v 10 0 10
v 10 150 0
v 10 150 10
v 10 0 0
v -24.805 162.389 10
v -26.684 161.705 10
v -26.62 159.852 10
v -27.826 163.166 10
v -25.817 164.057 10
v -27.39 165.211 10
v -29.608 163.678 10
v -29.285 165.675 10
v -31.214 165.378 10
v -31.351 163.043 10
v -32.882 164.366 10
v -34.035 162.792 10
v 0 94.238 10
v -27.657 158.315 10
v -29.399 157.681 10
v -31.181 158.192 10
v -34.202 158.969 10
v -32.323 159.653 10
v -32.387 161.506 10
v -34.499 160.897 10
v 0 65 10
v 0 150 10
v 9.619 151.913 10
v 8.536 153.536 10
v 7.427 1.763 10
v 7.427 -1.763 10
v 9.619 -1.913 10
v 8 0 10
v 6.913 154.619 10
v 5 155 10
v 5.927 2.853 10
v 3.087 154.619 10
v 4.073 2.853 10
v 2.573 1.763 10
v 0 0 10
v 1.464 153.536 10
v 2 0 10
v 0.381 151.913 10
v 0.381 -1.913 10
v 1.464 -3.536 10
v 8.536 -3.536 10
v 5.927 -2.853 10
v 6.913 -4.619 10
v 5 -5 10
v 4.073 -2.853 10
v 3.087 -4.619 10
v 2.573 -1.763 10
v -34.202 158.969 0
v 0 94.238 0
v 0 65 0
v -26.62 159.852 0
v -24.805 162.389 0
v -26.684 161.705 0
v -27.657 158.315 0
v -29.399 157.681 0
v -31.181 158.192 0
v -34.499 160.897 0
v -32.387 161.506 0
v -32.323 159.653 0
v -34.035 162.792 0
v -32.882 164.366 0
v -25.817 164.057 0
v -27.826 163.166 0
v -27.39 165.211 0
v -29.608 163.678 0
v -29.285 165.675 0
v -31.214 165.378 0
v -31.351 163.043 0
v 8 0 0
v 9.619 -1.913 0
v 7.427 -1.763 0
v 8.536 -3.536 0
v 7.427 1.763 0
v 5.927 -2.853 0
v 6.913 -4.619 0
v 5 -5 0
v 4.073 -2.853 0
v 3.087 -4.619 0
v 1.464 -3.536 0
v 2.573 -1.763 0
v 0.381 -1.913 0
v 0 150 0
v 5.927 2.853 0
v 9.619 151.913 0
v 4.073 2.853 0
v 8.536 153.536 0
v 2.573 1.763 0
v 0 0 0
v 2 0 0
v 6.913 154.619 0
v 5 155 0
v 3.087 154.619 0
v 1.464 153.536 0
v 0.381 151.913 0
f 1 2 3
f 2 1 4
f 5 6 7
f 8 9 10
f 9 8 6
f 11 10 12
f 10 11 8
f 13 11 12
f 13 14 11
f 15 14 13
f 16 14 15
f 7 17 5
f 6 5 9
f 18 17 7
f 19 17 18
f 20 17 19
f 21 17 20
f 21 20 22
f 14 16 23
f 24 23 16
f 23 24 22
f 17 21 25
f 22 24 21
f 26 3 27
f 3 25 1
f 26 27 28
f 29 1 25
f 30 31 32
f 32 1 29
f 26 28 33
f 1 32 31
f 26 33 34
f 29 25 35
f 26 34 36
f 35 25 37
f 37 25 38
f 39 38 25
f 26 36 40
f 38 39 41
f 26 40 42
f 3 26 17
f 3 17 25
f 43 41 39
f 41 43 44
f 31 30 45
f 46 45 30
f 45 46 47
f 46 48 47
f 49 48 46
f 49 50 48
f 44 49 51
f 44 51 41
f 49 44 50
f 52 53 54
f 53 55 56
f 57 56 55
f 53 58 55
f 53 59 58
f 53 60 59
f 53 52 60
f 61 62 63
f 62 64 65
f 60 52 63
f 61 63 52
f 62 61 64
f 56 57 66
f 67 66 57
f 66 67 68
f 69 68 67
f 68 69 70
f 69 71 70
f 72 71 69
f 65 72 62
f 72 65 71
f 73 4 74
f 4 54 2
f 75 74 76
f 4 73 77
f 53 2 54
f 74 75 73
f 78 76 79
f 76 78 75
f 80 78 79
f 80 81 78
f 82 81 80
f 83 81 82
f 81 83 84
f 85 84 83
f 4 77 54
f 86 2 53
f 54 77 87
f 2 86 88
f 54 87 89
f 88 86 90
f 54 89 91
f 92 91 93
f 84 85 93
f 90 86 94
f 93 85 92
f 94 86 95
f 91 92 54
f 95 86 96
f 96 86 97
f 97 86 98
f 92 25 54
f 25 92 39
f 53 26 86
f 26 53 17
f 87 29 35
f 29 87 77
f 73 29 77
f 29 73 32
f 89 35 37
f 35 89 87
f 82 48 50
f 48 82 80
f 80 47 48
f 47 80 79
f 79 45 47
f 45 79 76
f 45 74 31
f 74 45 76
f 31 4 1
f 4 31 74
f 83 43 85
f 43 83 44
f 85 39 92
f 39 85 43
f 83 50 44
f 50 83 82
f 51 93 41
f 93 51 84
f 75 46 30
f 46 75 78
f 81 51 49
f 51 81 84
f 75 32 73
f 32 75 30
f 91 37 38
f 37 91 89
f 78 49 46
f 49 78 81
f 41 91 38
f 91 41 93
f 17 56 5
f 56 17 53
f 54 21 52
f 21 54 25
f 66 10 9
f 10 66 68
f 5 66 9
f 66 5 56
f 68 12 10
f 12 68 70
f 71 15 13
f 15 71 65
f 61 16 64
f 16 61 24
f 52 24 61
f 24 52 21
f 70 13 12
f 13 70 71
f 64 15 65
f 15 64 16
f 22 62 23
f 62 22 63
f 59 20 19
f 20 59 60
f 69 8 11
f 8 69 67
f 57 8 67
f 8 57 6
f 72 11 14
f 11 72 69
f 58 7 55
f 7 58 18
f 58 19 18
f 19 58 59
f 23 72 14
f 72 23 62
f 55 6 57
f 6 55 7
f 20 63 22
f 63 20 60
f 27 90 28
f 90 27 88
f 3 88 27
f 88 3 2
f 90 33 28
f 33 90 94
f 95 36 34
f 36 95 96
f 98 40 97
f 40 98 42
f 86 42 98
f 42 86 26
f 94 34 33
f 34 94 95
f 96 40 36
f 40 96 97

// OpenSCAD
length_HandleArm=150;//[20:250]
length_MountArm=100;//[20:250]
position_Arm=50;//[0:1]
angle_MountArm=20;//[5:90]
maxarm=(length_HandleArm-20);
HandleHole=3;
MountHole=3;
position_Arm1=(position_Arm/100);


    color("Blue")
difference(){
cube([10,length_HandleArm,10],0,0,0);
    translate([5,0,0])
    cylinder(h=40,r=HandleHole,center=true);
    }
translate([5,length_HandleArm,0])
    color("Blue")
    cylinder(h=10,r=5);

translate([5,0,0])
color("OrangeRed")
    difference(){
        cylinder(h=10,r=5);
        cylinder(h=40,r=HandleHole,center=true);  
    }
translate([0,maxarm*position_Arm1,0])
rotate(a=[0,0,angle_MountArm])
    color("OrangeRed")
    difference(){
        union(){
            cube([10,length_MountArm,10],0,0,0);
            translate([5,length_MountArm,0])
            cylinder(h=10,r=5,center=false);
            
        }
        translate([5,length_MountArm,0])
        cylinder(h=40,r=MountHole,center=true);
    }
    
    
    
